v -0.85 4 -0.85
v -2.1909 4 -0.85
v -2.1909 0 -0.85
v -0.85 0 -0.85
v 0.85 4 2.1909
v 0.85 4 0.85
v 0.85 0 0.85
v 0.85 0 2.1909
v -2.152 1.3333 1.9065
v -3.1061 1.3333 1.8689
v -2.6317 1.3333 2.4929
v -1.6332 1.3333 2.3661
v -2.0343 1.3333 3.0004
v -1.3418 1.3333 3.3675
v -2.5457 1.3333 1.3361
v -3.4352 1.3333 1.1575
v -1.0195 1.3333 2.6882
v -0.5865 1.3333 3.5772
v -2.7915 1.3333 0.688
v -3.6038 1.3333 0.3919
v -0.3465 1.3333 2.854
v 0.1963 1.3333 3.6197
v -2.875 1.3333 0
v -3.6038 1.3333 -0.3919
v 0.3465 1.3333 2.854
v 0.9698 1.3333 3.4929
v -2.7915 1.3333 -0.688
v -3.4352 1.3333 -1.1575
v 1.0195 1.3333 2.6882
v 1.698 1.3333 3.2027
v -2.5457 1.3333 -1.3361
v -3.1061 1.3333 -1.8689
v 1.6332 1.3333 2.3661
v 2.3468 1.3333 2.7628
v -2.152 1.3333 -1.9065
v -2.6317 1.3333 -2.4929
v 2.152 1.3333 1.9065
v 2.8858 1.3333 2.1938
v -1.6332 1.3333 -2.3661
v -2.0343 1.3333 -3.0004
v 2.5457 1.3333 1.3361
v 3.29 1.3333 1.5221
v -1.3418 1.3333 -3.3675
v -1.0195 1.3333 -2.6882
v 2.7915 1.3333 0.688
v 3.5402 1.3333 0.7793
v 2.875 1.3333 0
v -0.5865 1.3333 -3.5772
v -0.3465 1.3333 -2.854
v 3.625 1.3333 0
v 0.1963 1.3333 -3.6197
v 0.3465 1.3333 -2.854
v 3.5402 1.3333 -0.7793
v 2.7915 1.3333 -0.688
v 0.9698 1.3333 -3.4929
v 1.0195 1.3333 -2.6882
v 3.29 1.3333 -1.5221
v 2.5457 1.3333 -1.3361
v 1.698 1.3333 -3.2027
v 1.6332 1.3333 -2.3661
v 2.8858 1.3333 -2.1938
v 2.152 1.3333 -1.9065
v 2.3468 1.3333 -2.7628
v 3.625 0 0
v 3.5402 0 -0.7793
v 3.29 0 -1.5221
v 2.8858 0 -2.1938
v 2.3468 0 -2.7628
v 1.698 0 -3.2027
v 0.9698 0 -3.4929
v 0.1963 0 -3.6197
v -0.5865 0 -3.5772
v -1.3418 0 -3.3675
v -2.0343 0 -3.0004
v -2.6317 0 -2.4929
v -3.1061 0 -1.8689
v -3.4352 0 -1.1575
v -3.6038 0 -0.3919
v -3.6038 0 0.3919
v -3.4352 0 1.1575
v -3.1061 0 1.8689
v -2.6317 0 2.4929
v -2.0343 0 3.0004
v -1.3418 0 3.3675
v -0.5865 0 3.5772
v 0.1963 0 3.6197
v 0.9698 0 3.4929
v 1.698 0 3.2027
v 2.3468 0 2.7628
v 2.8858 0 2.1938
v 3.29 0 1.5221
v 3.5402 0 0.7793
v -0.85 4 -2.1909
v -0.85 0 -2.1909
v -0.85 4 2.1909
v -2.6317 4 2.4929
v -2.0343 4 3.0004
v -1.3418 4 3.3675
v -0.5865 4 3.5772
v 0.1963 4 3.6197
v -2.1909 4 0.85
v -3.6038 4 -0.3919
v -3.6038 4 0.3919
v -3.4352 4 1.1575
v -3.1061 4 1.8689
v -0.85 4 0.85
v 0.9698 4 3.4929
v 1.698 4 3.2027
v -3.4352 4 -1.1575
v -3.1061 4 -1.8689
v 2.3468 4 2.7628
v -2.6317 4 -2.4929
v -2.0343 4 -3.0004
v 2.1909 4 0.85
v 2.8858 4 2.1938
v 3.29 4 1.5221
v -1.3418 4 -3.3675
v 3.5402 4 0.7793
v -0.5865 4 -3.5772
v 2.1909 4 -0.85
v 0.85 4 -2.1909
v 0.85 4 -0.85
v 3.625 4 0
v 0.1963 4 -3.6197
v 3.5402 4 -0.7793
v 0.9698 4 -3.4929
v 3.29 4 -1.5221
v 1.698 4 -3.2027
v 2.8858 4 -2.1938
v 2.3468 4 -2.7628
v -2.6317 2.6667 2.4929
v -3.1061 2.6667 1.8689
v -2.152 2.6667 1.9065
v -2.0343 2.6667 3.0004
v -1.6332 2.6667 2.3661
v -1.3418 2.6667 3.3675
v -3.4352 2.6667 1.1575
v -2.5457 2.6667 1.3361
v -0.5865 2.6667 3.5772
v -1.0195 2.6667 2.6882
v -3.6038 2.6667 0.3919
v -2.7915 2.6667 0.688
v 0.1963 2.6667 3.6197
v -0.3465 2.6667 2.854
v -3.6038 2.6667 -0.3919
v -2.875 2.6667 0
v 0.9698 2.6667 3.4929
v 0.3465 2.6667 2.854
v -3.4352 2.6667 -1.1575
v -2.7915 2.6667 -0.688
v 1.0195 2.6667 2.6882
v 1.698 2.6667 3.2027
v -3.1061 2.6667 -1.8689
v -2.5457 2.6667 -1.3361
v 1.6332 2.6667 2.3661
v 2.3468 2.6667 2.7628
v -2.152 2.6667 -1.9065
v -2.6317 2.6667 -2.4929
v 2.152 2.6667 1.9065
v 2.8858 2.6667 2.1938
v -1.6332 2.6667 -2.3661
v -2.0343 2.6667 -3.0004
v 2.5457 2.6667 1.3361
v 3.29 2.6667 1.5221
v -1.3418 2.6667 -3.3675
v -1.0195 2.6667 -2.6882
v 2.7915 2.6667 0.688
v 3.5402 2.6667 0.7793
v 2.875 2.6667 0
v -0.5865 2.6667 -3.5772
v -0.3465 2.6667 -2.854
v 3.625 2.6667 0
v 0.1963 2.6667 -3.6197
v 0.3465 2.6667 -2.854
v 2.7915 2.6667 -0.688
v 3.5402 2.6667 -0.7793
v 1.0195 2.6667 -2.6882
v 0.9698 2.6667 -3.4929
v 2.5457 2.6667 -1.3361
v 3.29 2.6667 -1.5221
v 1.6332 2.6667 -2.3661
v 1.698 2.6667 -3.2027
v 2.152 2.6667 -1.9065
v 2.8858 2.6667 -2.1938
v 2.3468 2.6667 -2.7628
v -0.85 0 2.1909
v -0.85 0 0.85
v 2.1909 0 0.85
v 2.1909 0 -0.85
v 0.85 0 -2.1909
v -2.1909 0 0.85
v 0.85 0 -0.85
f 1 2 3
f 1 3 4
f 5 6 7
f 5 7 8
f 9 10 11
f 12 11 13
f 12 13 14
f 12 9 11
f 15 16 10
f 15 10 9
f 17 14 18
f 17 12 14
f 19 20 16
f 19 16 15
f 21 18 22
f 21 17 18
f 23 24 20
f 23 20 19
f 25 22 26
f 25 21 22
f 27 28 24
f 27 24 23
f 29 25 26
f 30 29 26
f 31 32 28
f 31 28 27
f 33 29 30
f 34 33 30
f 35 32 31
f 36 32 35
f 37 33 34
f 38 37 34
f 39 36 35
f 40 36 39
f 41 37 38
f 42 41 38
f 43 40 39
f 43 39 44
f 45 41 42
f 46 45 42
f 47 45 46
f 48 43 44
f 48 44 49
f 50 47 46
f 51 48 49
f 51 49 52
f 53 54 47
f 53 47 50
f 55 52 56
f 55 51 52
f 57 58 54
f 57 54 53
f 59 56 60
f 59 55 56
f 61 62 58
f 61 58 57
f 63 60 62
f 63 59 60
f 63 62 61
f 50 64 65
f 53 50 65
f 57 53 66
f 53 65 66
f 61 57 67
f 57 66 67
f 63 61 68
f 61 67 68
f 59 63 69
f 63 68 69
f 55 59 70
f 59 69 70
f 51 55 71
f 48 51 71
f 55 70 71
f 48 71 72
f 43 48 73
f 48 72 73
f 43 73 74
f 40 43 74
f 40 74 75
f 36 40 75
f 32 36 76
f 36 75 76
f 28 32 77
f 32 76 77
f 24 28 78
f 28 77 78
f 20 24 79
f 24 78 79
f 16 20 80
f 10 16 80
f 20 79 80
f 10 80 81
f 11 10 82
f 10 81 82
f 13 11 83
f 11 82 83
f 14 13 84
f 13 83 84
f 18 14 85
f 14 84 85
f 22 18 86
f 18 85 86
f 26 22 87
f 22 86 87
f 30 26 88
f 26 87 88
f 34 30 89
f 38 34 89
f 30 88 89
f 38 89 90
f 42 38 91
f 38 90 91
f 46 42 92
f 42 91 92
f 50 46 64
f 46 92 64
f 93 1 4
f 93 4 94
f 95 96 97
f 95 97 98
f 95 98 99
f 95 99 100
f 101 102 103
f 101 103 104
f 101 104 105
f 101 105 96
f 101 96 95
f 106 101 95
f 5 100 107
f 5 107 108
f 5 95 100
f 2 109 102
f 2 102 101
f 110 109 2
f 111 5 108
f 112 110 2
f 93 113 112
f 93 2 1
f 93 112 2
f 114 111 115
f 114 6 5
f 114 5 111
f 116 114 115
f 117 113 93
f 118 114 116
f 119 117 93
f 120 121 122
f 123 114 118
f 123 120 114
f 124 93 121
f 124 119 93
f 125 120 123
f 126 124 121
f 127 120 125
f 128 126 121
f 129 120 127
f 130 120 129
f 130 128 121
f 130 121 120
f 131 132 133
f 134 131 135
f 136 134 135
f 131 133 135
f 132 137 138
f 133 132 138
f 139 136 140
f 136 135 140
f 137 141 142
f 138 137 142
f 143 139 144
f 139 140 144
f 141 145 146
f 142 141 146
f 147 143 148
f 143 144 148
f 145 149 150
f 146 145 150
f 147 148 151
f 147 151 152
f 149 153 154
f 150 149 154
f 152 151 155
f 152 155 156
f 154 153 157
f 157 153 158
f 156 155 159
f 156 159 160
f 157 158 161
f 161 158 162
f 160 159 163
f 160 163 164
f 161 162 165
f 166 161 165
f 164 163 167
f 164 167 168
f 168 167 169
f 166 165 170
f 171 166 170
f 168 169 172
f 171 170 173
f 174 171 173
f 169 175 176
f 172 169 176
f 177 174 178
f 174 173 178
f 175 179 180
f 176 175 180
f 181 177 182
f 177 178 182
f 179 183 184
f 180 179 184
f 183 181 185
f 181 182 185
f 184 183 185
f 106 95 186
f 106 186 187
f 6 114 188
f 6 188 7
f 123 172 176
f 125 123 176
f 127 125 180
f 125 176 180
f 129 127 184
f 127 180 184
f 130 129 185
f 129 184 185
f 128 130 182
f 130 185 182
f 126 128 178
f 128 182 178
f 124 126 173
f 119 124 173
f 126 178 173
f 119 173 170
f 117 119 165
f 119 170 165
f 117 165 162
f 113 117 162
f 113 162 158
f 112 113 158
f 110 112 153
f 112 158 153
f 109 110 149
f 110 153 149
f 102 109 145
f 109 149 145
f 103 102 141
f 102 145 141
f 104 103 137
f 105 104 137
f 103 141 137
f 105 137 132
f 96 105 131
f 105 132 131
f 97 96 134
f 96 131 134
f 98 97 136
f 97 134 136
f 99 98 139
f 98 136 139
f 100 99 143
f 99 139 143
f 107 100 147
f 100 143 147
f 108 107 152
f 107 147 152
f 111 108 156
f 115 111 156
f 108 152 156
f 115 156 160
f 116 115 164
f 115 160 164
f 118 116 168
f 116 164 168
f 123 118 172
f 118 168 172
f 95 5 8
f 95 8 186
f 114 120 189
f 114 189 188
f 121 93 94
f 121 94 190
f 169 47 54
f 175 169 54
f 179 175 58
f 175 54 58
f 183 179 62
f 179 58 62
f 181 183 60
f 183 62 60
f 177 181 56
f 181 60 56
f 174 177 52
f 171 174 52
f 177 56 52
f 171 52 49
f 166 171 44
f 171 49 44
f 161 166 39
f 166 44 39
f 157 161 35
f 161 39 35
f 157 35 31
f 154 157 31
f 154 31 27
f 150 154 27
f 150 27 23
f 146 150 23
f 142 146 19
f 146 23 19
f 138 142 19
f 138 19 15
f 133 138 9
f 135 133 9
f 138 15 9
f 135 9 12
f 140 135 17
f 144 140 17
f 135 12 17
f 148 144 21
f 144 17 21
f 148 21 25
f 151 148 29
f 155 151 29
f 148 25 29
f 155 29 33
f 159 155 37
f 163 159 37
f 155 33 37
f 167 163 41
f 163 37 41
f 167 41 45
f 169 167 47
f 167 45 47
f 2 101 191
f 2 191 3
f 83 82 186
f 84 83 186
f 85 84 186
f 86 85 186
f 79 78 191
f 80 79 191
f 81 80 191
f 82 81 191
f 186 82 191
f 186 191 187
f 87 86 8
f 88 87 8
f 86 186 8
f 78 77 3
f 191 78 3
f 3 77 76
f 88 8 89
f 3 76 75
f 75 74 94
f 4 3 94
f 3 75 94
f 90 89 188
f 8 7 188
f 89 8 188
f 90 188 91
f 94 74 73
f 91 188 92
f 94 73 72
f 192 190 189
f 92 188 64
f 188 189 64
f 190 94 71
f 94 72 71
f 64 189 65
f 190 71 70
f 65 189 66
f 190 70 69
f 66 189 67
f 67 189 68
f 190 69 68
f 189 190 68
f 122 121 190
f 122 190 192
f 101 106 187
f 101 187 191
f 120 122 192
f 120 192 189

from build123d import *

# Parameters (mm, degrees)
SKETCH2_R           = 3.625
BOSS_EXTRUDE1_DEPTH = 1.33333333
SKETCH6_R           = 2.875
BOSS_EXTRUDE2_DEPTH = 1.33333333
SKETCH7_R           = 3.625
BOSS_EXTRUDE3_DEPTH = 1.33333333
CUT_EXTRUDE1_DEPTH  = 4.99999999


with BuildPart() as part:
    # Sketch2 → Boss-Extrude1 (new body)
    with BuildSketch(Plane(origin=(0, 0, 0), x_dir=(1, 0, 0), z_dir=(0, 1, 0))):
        Circle(SKETCH2_R)
    extrude(amount=BOSS_EXTRUDE1_DEPTH)

    # Sketch6 → Boss-Extrude2 (add)
    with BuildSketch(Plane(origin=(0, 1.33333333, 0), x_dir=(1, 0, 0), z_dir=(0, 1, 0))):
        Circle(SKETCH6_R)
    extrude(amount=BOSS_EXTRUDE2_DEPTH)

    # Sketch7 → Boss-Extrude3 (add)
    with BuildSketch(Plane(origin=(0, 2.66666666, 0), x_dir=(1, 0, 0), z_dir=(0, 1, 0))):
        Circle(SKETCH7_R)
    extrude(amount=BOSS_EXTRUDE3_DEPTH)

    # Sketch8 → Cut-Extrude1 (cut, through all)
    with BuildSketch(Plane(origin=(0, 3.99999999, 0), x_dir=(1, 0, 0), z_dir=(0, 1, 0))):
        Polygon((-0.85, 0.85), (-0.85, 2.19089023), (0.85, 2.19089023), (0.85, 0.85), (2.19089023, 0.85), (2.19089023, -0.85), (0.85, -0.85), (0.85, -2.19089023), (-0.85, -2.19089023), (-0.85, -0.85), (-2.19089023, -0.85), (-2.19089023, 0.85), align=None)
    extrude(amount=-CUT_EXTRUDE1_DEPTH, mode=Mode.SUBTRACT)


solid = part.part
